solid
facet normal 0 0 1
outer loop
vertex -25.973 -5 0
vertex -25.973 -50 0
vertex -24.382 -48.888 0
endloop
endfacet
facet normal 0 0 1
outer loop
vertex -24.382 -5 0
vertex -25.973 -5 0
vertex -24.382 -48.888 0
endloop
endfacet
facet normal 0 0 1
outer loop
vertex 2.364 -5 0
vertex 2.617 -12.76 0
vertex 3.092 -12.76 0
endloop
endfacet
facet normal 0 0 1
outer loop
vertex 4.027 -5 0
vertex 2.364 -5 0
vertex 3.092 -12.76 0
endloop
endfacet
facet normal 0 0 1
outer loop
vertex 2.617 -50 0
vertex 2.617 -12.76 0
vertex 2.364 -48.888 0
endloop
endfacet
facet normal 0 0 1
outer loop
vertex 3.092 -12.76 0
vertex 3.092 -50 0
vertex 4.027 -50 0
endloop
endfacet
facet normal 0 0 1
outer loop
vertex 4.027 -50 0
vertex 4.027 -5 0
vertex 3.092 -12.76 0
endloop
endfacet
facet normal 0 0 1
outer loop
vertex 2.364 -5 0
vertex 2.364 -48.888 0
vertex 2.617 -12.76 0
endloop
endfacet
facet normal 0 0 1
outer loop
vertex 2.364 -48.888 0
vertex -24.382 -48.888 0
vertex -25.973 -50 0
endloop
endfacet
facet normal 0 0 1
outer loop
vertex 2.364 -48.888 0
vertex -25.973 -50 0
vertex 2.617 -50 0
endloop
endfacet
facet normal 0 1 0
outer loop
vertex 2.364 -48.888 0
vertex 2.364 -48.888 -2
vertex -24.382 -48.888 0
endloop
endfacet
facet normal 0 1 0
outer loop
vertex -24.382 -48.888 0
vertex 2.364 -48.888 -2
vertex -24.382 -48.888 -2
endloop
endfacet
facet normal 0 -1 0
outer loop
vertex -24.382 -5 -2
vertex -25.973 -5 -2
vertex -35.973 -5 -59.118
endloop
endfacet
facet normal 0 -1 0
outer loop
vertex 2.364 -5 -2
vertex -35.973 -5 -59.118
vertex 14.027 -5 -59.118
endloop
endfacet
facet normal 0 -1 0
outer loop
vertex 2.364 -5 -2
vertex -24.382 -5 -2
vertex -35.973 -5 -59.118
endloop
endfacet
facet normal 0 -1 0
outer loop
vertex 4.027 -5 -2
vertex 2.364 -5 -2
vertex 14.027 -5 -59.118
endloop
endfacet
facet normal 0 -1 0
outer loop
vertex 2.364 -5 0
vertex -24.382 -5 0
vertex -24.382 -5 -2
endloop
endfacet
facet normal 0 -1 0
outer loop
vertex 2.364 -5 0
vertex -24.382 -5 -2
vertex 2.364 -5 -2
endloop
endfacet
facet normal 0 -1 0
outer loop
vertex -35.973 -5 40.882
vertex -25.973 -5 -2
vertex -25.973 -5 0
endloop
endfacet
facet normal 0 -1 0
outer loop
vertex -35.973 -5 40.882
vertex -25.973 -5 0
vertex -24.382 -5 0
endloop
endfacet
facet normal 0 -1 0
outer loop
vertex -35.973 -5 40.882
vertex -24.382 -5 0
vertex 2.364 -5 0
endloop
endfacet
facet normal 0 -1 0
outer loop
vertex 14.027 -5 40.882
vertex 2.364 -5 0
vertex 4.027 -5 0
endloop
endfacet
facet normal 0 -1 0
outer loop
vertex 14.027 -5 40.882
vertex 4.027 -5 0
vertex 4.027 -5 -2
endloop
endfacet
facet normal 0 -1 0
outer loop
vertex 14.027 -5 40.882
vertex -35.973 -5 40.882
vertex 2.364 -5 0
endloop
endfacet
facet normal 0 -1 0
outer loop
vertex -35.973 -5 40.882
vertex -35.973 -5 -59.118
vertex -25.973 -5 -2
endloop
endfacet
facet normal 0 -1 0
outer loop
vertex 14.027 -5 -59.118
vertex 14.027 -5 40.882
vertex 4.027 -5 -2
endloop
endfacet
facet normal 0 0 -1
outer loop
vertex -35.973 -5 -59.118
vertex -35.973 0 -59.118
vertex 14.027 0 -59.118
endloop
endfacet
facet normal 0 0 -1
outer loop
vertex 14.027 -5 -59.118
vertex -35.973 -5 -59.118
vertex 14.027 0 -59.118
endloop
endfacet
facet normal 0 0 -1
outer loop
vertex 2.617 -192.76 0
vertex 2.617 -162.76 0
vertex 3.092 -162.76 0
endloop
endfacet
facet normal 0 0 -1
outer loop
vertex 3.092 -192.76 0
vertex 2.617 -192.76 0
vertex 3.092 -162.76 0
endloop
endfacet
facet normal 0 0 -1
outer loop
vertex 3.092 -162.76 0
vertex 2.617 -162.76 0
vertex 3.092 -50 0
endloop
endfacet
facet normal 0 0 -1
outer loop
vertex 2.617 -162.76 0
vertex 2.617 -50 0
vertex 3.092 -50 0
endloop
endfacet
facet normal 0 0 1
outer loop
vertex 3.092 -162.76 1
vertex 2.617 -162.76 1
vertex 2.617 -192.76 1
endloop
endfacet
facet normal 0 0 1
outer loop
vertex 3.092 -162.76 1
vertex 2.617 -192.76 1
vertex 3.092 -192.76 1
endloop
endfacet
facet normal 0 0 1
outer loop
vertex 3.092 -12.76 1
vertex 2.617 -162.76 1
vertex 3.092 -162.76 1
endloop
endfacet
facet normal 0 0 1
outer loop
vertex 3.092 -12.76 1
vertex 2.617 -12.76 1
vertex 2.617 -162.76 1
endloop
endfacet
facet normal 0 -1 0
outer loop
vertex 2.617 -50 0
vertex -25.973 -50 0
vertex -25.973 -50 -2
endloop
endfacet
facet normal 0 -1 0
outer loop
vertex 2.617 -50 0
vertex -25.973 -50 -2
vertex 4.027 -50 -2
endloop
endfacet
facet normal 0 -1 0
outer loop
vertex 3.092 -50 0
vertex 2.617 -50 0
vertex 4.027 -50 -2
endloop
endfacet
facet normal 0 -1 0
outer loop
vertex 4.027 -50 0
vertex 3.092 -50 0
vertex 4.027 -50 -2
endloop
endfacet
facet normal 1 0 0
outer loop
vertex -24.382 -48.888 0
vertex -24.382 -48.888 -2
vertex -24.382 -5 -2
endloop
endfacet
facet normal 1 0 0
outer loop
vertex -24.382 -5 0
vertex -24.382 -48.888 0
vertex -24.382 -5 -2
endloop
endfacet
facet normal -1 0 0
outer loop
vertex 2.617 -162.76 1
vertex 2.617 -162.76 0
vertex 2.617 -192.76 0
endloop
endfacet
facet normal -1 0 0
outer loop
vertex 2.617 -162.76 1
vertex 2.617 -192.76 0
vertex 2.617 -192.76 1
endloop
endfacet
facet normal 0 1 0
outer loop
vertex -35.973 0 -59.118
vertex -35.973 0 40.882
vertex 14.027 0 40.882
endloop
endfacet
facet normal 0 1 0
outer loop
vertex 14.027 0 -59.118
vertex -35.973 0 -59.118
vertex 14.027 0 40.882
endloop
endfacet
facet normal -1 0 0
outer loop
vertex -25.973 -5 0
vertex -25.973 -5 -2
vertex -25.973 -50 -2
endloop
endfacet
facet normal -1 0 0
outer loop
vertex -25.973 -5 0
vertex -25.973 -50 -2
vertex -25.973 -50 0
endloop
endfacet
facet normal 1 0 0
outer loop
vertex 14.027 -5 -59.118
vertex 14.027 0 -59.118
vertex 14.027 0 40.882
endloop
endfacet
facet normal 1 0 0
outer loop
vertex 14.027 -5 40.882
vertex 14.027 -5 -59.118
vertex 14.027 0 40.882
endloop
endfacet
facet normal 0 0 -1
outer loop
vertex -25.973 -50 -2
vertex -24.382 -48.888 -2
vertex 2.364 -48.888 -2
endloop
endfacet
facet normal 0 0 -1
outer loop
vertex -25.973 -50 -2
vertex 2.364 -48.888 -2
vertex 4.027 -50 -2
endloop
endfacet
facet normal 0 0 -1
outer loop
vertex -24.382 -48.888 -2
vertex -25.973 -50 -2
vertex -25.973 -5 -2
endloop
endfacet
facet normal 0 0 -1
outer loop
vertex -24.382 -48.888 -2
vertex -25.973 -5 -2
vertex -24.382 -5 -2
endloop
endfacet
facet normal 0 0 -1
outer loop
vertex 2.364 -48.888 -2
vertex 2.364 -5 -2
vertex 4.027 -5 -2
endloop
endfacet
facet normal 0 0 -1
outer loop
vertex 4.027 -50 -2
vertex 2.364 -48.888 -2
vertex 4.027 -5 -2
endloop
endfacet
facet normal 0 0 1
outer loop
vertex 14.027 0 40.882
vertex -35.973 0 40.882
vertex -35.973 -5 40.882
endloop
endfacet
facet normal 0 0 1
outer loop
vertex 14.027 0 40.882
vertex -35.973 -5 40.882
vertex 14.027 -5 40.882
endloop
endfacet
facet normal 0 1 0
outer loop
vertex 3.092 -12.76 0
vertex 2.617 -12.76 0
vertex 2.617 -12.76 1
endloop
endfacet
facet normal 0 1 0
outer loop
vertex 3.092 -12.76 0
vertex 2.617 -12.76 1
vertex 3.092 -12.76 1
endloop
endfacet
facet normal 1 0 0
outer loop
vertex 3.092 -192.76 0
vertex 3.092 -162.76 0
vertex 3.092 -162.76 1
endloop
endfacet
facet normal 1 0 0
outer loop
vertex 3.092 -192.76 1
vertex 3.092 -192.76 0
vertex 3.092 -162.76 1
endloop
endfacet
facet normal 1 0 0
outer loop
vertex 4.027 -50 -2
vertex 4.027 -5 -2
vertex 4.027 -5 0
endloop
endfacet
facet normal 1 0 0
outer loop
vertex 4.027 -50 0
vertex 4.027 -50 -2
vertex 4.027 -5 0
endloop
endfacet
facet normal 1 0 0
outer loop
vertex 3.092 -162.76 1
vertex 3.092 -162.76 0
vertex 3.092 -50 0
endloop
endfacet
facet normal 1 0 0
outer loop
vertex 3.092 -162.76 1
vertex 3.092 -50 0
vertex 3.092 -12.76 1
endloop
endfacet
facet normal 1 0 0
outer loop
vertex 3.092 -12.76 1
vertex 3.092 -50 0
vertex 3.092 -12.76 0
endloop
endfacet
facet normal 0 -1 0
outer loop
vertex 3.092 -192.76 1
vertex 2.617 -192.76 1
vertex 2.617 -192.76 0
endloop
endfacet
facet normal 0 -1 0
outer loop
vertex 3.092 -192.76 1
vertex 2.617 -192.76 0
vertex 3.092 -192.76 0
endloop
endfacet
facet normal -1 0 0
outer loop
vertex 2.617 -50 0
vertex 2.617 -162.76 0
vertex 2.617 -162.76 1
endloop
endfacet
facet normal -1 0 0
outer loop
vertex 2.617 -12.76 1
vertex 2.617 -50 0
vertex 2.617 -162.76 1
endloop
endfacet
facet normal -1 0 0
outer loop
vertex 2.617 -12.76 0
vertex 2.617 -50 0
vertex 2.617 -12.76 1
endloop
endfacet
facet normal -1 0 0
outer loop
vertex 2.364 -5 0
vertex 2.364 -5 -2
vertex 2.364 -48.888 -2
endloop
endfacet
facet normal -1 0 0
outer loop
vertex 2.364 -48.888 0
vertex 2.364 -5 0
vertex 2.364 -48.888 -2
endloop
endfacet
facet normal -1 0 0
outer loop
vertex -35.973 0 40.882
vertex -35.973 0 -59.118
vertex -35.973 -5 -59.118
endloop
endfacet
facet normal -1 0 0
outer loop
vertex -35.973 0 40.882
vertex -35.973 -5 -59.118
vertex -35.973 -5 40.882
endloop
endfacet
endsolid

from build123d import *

# Parameters (mm, degrees)
F0_W      = 50
F0_H      = 100
F1_DEPTH  = 5
F2_W      = 30
F2_H      = 2
F3_DEPTH  = 45
F5_DEPTH  = 41
F6_W      = 0.475269
F6_H      = 150
F7_DEPTH  = 1
F7_FACE_W = 0.47527
F7_FACE_H = 1
F8_DEPTH  = 30


with BuildPart() as f1:
    # F0 (on Front) → F1 (new body)
    with BuildSketch(Plane.XZ):
        with Locations((-10.973271, -9.118421)):
            Rectangle(F0_W, F0_H)
    extrude(amount=F1_DEPTH)

    # F2 (on face) → F3 (join)
    with BuildSketch(Plane.XZ.offset(5)):
        with Locations((-10.973271, -1)):
            Rectangle(F2_W, F2_H)
    extrude(amount=F3_DEPTH)

    # F4 (on face) → F5 (cut)
    with BuildSketch(Plane(origin=(0, 0, -2), x_dir=(1, 0, 0), z_dir=(0, 0, -1))):
        Polygon((-24.382181, 5), (-21.973271, 5), (0, 5), (2.364369, 5), (2.364369, 48.887726), (-24.382181, 48.887726), align=None)
    extrude(amount=-F5_DEPTH, mode=Mode.SUBTRACT)

    # F6 (on face) → F7 (join)
    with BuildSketch(Plane.XY):
        with Locations((2.854673, -87.759547)):
            Rectangle(F6_W, F6_H)
    extrude(amount=F7_DEPTH)

    # F7_face (on face) → F8 (join)
    with BuildSketch(Plane(origin=(2.854674, -162.759547, 0.5), x_dir=(1, 0, 0), z_dir=(0, -1, 0))):
        Rectangle(F7_FACE_W, F7_FACE_H)
    extrude(amount=F8_DEPTH)


solid = f1.part
